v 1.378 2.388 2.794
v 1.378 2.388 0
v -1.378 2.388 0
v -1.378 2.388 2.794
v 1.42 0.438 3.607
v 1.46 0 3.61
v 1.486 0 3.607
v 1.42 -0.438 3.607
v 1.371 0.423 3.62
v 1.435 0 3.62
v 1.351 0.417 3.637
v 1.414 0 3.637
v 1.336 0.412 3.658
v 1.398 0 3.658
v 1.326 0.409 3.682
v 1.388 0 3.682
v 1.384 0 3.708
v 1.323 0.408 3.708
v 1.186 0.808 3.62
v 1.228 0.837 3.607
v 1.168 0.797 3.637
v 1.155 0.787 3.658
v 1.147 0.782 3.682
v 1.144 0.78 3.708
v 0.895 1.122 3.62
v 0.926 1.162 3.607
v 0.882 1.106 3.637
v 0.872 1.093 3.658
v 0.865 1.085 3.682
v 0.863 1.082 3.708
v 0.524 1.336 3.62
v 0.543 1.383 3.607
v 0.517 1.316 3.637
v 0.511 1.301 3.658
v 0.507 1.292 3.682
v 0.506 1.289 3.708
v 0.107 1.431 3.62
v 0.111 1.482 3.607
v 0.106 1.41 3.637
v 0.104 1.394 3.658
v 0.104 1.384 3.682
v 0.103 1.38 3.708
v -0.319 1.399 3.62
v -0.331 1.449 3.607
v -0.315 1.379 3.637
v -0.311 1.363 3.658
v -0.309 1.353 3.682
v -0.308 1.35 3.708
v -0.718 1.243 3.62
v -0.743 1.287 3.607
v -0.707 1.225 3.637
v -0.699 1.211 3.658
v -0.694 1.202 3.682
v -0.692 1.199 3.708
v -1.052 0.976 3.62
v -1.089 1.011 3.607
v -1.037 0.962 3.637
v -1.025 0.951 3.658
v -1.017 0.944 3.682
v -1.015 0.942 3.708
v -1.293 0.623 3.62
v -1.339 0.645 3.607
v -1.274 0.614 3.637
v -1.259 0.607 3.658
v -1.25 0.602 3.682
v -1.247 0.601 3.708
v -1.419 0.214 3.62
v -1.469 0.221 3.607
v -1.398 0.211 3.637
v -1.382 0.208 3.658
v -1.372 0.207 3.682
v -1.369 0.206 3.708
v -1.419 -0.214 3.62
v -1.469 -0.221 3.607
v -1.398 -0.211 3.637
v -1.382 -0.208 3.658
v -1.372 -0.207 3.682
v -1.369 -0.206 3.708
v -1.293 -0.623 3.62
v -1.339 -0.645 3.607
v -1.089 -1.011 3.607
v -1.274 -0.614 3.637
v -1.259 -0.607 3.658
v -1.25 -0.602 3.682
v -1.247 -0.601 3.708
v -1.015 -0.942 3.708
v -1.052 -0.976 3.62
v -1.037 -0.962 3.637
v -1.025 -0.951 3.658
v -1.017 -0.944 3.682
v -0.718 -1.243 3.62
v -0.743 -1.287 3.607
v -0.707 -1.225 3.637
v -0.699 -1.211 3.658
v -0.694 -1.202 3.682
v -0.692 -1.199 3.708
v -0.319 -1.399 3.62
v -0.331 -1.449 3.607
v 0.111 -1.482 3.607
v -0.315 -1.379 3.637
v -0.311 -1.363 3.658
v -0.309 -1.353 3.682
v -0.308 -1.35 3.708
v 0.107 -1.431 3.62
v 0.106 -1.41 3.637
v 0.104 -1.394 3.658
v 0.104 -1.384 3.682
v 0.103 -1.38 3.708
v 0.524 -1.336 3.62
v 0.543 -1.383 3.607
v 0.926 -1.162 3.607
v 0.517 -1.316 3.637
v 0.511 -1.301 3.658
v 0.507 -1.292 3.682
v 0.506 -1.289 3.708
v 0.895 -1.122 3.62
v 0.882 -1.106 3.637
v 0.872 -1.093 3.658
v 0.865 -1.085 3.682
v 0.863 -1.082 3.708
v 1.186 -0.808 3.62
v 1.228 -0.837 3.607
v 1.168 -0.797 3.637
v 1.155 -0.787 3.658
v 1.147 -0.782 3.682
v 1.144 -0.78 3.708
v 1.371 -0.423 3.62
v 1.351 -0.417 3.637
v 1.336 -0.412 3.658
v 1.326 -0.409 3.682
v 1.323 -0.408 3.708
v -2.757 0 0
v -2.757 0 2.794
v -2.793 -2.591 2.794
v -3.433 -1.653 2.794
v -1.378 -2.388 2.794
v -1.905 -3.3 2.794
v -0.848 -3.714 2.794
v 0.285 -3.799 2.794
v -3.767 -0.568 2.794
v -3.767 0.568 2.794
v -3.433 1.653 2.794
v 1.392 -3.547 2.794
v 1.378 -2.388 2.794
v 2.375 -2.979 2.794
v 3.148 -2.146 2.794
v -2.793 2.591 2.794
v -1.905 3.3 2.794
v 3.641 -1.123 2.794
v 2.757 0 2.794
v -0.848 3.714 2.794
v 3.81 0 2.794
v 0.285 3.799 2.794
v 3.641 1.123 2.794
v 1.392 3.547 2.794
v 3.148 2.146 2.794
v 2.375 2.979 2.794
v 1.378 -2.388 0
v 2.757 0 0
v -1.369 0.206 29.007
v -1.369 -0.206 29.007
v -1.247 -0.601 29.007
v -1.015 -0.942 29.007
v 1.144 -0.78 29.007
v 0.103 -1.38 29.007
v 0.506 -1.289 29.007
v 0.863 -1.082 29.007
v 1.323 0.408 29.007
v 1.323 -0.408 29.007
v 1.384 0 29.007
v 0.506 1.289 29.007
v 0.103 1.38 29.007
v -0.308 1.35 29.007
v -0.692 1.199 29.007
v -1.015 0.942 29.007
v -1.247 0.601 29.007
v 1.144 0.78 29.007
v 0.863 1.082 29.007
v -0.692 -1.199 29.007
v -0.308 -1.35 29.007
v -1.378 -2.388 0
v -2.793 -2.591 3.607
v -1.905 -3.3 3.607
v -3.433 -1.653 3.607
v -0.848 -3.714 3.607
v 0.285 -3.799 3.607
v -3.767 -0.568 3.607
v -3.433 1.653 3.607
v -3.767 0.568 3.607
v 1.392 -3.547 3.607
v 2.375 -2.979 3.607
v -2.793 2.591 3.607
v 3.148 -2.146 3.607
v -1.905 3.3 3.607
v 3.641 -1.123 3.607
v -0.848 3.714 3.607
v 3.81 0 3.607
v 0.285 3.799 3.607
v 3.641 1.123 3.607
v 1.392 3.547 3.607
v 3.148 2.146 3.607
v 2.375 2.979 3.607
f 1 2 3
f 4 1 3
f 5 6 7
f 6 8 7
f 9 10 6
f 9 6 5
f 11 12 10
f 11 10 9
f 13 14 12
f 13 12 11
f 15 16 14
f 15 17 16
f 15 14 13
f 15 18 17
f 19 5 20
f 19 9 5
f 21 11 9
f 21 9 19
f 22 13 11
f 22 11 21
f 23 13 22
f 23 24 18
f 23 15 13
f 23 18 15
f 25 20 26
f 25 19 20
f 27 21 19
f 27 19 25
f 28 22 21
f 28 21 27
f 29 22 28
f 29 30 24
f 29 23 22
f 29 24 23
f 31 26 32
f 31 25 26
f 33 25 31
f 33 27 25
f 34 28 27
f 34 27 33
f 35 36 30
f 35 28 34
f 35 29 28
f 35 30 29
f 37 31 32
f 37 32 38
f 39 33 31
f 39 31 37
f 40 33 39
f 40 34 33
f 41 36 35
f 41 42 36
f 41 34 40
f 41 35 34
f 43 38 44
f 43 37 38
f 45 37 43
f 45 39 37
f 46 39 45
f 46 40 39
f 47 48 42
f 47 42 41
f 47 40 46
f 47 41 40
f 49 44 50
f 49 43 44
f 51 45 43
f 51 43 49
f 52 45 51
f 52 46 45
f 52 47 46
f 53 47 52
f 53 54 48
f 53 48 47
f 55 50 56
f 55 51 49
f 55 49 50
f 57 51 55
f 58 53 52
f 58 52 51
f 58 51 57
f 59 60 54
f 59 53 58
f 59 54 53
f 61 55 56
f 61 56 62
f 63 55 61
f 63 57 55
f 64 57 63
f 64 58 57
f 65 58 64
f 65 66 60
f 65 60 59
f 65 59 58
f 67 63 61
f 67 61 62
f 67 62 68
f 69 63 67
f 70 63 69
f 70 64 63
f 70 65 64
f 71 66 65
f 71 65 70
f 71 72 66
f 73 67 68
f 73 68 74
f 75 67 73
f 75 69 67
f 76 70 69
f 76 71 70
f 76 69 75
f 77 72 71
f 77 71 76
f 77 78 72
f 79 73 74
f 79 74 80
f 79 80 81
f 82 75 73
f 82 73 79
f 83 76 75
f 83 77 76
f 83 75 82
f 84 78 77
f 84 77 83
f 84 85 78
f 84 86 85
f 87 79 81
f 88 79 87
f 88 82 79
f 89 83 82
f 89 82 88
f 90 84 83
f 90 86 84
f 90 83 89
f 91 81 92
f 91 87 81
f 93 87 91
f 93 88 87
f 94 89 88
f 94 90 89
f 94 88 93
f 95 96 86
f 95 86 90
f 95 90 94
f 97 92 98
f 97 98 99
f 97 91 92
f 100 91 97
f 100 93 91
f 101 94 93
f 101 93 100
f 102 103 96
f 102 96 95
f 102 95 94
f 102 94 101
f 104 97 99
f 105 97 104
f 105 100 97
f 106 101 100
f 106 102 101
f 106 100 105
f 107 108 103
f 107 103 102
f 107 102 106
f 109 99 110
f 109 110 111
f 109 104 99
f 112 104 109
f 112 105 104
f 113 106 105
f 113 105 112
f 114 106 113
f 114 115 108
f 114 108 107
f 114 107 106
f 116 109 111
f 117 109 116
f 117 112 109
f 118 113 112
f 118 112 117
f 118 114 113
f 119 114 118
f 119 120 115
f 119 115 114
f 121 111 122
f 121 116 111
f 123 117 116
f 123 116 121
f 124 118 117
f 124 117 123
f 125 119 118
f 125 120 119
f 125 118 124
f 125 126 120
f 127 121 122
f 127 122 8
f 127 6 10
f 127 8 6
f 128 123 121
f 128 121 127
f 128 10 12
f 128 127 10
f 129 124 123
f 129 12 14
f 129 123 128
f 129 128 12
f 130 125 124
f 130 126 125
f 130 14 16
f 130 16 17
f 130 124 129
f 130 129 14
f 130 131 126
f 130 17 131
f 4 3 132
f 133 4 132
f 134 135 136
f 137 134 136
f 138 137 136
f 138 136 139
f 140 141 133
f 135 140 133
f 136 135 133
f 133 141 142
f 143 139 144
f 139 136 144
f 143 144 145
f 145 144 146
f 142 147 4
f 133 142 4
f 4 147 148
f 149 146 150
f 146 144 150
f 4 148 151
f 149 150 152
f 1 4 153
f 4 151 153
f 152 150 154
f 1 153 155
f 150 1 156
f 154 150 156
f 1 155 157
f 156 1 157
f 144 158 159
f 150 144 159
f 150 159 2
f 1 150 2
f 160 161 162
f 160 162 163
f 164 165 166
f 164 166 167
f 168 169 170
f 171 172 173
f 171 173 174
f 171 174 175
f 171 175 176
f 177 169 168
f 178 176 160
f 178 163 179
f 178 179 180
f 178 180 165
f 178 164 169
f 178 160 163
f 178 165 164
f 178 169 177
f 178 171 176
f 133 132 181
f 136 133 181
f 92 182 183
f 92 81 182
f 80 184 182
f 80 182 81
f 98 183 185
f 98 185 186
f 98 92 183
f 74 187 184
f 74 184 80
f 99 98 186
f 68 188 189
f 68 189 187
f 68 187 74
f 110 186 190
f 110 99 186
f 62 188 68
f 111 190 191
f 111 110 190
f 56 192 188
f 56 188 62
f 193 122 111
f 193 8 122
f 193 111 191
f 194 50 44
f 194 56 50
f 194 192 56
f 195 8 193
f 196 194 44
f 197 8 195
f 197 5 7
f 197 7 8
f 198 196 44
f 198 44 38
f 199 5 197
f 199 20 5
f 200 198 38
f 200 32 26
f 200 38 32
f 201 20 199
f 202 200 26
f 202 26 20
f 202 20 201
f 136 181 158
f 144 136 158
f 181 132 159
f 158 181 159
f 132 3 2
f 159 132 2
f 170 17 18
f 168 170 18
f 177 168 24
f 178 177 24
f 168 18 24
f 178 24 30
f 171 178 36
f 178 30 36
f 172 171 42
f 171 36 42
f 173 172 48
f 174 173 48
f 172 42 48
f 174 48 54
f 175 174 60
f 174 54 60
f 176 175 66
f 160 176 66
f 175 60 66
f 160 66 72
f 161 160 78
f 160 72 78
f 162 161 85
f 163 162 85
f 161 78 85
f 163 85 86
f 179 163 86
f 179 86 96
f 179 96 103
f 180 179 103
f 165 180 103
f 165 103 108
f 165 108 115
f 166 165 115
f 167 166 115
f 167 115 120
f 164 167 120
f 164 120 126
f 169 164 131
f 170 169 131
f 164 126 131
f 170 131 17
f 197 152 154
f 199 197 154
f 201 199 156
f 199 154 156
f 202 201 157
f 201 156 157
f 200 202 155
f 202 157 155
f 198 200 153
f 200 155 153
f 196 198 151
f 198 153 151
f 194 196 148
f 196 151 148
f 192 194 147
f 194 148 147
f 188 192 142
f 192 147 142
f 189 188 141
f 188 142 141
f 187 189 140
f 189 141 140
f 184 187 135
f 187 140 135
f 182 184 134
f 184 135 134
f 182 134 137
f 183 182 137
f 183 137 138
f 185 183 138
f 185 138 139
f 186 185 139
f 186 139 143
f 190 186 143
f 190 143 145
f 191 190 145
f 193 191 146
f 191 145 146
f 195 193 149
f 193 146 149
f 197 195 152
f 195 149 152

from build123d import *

# Parameters (mm, degrees)
BOSS_EXTRUDE1_DEPTH = 2.794
SKETCH2_R           = 3.81
BOSS_EXTRUDE2_DEPTH = 0.8128
SKETCH3_R           = 1.3843
BOSS_EXTRUDE3_DEPTH = 25.4
FILLET1_R           = 0.1016


with BuildPart() as part:
    # Sketch1 → Boss-Extrude1 (new body)
    with BuildSketch(Plane.XY):
        Polygon((2.756963005, 0), (1.378481503, 2.3876), (-1.378481503, 2.3876), (-2.756963005, 0), (-1.378481503, -2.3876), (1.378481503, -2.3876), align=None)
    extrude(amount=BOSS_EXTRUDE1_DEPTH)

    # Sketch2 → Boss-Extrude2 (add)
    with BuildSketch(Plane.XY.offset(2.794)):
        Circle(SKETCH2_R)
    extrude(amount=BOSS_EXTRUDE2_DEPTH)

    # Sketch3 → Boss-Extrude3 (add)
    with BuildSketch(Plane.XY.offset(3.6068)):
        Circle(SKETCH3_R)
    extrude(amount=BOSS_EXTRUDE3_DEPTH)

    # Fillet1
    fillet1_edges = [part.edges().sort_by_distance(p)[0] for p in [
        (-1.3843, 0, 3.6068),
    ]]
    fillet(fillet1_edges, radius=FILLET1_R)


solid = part.part
